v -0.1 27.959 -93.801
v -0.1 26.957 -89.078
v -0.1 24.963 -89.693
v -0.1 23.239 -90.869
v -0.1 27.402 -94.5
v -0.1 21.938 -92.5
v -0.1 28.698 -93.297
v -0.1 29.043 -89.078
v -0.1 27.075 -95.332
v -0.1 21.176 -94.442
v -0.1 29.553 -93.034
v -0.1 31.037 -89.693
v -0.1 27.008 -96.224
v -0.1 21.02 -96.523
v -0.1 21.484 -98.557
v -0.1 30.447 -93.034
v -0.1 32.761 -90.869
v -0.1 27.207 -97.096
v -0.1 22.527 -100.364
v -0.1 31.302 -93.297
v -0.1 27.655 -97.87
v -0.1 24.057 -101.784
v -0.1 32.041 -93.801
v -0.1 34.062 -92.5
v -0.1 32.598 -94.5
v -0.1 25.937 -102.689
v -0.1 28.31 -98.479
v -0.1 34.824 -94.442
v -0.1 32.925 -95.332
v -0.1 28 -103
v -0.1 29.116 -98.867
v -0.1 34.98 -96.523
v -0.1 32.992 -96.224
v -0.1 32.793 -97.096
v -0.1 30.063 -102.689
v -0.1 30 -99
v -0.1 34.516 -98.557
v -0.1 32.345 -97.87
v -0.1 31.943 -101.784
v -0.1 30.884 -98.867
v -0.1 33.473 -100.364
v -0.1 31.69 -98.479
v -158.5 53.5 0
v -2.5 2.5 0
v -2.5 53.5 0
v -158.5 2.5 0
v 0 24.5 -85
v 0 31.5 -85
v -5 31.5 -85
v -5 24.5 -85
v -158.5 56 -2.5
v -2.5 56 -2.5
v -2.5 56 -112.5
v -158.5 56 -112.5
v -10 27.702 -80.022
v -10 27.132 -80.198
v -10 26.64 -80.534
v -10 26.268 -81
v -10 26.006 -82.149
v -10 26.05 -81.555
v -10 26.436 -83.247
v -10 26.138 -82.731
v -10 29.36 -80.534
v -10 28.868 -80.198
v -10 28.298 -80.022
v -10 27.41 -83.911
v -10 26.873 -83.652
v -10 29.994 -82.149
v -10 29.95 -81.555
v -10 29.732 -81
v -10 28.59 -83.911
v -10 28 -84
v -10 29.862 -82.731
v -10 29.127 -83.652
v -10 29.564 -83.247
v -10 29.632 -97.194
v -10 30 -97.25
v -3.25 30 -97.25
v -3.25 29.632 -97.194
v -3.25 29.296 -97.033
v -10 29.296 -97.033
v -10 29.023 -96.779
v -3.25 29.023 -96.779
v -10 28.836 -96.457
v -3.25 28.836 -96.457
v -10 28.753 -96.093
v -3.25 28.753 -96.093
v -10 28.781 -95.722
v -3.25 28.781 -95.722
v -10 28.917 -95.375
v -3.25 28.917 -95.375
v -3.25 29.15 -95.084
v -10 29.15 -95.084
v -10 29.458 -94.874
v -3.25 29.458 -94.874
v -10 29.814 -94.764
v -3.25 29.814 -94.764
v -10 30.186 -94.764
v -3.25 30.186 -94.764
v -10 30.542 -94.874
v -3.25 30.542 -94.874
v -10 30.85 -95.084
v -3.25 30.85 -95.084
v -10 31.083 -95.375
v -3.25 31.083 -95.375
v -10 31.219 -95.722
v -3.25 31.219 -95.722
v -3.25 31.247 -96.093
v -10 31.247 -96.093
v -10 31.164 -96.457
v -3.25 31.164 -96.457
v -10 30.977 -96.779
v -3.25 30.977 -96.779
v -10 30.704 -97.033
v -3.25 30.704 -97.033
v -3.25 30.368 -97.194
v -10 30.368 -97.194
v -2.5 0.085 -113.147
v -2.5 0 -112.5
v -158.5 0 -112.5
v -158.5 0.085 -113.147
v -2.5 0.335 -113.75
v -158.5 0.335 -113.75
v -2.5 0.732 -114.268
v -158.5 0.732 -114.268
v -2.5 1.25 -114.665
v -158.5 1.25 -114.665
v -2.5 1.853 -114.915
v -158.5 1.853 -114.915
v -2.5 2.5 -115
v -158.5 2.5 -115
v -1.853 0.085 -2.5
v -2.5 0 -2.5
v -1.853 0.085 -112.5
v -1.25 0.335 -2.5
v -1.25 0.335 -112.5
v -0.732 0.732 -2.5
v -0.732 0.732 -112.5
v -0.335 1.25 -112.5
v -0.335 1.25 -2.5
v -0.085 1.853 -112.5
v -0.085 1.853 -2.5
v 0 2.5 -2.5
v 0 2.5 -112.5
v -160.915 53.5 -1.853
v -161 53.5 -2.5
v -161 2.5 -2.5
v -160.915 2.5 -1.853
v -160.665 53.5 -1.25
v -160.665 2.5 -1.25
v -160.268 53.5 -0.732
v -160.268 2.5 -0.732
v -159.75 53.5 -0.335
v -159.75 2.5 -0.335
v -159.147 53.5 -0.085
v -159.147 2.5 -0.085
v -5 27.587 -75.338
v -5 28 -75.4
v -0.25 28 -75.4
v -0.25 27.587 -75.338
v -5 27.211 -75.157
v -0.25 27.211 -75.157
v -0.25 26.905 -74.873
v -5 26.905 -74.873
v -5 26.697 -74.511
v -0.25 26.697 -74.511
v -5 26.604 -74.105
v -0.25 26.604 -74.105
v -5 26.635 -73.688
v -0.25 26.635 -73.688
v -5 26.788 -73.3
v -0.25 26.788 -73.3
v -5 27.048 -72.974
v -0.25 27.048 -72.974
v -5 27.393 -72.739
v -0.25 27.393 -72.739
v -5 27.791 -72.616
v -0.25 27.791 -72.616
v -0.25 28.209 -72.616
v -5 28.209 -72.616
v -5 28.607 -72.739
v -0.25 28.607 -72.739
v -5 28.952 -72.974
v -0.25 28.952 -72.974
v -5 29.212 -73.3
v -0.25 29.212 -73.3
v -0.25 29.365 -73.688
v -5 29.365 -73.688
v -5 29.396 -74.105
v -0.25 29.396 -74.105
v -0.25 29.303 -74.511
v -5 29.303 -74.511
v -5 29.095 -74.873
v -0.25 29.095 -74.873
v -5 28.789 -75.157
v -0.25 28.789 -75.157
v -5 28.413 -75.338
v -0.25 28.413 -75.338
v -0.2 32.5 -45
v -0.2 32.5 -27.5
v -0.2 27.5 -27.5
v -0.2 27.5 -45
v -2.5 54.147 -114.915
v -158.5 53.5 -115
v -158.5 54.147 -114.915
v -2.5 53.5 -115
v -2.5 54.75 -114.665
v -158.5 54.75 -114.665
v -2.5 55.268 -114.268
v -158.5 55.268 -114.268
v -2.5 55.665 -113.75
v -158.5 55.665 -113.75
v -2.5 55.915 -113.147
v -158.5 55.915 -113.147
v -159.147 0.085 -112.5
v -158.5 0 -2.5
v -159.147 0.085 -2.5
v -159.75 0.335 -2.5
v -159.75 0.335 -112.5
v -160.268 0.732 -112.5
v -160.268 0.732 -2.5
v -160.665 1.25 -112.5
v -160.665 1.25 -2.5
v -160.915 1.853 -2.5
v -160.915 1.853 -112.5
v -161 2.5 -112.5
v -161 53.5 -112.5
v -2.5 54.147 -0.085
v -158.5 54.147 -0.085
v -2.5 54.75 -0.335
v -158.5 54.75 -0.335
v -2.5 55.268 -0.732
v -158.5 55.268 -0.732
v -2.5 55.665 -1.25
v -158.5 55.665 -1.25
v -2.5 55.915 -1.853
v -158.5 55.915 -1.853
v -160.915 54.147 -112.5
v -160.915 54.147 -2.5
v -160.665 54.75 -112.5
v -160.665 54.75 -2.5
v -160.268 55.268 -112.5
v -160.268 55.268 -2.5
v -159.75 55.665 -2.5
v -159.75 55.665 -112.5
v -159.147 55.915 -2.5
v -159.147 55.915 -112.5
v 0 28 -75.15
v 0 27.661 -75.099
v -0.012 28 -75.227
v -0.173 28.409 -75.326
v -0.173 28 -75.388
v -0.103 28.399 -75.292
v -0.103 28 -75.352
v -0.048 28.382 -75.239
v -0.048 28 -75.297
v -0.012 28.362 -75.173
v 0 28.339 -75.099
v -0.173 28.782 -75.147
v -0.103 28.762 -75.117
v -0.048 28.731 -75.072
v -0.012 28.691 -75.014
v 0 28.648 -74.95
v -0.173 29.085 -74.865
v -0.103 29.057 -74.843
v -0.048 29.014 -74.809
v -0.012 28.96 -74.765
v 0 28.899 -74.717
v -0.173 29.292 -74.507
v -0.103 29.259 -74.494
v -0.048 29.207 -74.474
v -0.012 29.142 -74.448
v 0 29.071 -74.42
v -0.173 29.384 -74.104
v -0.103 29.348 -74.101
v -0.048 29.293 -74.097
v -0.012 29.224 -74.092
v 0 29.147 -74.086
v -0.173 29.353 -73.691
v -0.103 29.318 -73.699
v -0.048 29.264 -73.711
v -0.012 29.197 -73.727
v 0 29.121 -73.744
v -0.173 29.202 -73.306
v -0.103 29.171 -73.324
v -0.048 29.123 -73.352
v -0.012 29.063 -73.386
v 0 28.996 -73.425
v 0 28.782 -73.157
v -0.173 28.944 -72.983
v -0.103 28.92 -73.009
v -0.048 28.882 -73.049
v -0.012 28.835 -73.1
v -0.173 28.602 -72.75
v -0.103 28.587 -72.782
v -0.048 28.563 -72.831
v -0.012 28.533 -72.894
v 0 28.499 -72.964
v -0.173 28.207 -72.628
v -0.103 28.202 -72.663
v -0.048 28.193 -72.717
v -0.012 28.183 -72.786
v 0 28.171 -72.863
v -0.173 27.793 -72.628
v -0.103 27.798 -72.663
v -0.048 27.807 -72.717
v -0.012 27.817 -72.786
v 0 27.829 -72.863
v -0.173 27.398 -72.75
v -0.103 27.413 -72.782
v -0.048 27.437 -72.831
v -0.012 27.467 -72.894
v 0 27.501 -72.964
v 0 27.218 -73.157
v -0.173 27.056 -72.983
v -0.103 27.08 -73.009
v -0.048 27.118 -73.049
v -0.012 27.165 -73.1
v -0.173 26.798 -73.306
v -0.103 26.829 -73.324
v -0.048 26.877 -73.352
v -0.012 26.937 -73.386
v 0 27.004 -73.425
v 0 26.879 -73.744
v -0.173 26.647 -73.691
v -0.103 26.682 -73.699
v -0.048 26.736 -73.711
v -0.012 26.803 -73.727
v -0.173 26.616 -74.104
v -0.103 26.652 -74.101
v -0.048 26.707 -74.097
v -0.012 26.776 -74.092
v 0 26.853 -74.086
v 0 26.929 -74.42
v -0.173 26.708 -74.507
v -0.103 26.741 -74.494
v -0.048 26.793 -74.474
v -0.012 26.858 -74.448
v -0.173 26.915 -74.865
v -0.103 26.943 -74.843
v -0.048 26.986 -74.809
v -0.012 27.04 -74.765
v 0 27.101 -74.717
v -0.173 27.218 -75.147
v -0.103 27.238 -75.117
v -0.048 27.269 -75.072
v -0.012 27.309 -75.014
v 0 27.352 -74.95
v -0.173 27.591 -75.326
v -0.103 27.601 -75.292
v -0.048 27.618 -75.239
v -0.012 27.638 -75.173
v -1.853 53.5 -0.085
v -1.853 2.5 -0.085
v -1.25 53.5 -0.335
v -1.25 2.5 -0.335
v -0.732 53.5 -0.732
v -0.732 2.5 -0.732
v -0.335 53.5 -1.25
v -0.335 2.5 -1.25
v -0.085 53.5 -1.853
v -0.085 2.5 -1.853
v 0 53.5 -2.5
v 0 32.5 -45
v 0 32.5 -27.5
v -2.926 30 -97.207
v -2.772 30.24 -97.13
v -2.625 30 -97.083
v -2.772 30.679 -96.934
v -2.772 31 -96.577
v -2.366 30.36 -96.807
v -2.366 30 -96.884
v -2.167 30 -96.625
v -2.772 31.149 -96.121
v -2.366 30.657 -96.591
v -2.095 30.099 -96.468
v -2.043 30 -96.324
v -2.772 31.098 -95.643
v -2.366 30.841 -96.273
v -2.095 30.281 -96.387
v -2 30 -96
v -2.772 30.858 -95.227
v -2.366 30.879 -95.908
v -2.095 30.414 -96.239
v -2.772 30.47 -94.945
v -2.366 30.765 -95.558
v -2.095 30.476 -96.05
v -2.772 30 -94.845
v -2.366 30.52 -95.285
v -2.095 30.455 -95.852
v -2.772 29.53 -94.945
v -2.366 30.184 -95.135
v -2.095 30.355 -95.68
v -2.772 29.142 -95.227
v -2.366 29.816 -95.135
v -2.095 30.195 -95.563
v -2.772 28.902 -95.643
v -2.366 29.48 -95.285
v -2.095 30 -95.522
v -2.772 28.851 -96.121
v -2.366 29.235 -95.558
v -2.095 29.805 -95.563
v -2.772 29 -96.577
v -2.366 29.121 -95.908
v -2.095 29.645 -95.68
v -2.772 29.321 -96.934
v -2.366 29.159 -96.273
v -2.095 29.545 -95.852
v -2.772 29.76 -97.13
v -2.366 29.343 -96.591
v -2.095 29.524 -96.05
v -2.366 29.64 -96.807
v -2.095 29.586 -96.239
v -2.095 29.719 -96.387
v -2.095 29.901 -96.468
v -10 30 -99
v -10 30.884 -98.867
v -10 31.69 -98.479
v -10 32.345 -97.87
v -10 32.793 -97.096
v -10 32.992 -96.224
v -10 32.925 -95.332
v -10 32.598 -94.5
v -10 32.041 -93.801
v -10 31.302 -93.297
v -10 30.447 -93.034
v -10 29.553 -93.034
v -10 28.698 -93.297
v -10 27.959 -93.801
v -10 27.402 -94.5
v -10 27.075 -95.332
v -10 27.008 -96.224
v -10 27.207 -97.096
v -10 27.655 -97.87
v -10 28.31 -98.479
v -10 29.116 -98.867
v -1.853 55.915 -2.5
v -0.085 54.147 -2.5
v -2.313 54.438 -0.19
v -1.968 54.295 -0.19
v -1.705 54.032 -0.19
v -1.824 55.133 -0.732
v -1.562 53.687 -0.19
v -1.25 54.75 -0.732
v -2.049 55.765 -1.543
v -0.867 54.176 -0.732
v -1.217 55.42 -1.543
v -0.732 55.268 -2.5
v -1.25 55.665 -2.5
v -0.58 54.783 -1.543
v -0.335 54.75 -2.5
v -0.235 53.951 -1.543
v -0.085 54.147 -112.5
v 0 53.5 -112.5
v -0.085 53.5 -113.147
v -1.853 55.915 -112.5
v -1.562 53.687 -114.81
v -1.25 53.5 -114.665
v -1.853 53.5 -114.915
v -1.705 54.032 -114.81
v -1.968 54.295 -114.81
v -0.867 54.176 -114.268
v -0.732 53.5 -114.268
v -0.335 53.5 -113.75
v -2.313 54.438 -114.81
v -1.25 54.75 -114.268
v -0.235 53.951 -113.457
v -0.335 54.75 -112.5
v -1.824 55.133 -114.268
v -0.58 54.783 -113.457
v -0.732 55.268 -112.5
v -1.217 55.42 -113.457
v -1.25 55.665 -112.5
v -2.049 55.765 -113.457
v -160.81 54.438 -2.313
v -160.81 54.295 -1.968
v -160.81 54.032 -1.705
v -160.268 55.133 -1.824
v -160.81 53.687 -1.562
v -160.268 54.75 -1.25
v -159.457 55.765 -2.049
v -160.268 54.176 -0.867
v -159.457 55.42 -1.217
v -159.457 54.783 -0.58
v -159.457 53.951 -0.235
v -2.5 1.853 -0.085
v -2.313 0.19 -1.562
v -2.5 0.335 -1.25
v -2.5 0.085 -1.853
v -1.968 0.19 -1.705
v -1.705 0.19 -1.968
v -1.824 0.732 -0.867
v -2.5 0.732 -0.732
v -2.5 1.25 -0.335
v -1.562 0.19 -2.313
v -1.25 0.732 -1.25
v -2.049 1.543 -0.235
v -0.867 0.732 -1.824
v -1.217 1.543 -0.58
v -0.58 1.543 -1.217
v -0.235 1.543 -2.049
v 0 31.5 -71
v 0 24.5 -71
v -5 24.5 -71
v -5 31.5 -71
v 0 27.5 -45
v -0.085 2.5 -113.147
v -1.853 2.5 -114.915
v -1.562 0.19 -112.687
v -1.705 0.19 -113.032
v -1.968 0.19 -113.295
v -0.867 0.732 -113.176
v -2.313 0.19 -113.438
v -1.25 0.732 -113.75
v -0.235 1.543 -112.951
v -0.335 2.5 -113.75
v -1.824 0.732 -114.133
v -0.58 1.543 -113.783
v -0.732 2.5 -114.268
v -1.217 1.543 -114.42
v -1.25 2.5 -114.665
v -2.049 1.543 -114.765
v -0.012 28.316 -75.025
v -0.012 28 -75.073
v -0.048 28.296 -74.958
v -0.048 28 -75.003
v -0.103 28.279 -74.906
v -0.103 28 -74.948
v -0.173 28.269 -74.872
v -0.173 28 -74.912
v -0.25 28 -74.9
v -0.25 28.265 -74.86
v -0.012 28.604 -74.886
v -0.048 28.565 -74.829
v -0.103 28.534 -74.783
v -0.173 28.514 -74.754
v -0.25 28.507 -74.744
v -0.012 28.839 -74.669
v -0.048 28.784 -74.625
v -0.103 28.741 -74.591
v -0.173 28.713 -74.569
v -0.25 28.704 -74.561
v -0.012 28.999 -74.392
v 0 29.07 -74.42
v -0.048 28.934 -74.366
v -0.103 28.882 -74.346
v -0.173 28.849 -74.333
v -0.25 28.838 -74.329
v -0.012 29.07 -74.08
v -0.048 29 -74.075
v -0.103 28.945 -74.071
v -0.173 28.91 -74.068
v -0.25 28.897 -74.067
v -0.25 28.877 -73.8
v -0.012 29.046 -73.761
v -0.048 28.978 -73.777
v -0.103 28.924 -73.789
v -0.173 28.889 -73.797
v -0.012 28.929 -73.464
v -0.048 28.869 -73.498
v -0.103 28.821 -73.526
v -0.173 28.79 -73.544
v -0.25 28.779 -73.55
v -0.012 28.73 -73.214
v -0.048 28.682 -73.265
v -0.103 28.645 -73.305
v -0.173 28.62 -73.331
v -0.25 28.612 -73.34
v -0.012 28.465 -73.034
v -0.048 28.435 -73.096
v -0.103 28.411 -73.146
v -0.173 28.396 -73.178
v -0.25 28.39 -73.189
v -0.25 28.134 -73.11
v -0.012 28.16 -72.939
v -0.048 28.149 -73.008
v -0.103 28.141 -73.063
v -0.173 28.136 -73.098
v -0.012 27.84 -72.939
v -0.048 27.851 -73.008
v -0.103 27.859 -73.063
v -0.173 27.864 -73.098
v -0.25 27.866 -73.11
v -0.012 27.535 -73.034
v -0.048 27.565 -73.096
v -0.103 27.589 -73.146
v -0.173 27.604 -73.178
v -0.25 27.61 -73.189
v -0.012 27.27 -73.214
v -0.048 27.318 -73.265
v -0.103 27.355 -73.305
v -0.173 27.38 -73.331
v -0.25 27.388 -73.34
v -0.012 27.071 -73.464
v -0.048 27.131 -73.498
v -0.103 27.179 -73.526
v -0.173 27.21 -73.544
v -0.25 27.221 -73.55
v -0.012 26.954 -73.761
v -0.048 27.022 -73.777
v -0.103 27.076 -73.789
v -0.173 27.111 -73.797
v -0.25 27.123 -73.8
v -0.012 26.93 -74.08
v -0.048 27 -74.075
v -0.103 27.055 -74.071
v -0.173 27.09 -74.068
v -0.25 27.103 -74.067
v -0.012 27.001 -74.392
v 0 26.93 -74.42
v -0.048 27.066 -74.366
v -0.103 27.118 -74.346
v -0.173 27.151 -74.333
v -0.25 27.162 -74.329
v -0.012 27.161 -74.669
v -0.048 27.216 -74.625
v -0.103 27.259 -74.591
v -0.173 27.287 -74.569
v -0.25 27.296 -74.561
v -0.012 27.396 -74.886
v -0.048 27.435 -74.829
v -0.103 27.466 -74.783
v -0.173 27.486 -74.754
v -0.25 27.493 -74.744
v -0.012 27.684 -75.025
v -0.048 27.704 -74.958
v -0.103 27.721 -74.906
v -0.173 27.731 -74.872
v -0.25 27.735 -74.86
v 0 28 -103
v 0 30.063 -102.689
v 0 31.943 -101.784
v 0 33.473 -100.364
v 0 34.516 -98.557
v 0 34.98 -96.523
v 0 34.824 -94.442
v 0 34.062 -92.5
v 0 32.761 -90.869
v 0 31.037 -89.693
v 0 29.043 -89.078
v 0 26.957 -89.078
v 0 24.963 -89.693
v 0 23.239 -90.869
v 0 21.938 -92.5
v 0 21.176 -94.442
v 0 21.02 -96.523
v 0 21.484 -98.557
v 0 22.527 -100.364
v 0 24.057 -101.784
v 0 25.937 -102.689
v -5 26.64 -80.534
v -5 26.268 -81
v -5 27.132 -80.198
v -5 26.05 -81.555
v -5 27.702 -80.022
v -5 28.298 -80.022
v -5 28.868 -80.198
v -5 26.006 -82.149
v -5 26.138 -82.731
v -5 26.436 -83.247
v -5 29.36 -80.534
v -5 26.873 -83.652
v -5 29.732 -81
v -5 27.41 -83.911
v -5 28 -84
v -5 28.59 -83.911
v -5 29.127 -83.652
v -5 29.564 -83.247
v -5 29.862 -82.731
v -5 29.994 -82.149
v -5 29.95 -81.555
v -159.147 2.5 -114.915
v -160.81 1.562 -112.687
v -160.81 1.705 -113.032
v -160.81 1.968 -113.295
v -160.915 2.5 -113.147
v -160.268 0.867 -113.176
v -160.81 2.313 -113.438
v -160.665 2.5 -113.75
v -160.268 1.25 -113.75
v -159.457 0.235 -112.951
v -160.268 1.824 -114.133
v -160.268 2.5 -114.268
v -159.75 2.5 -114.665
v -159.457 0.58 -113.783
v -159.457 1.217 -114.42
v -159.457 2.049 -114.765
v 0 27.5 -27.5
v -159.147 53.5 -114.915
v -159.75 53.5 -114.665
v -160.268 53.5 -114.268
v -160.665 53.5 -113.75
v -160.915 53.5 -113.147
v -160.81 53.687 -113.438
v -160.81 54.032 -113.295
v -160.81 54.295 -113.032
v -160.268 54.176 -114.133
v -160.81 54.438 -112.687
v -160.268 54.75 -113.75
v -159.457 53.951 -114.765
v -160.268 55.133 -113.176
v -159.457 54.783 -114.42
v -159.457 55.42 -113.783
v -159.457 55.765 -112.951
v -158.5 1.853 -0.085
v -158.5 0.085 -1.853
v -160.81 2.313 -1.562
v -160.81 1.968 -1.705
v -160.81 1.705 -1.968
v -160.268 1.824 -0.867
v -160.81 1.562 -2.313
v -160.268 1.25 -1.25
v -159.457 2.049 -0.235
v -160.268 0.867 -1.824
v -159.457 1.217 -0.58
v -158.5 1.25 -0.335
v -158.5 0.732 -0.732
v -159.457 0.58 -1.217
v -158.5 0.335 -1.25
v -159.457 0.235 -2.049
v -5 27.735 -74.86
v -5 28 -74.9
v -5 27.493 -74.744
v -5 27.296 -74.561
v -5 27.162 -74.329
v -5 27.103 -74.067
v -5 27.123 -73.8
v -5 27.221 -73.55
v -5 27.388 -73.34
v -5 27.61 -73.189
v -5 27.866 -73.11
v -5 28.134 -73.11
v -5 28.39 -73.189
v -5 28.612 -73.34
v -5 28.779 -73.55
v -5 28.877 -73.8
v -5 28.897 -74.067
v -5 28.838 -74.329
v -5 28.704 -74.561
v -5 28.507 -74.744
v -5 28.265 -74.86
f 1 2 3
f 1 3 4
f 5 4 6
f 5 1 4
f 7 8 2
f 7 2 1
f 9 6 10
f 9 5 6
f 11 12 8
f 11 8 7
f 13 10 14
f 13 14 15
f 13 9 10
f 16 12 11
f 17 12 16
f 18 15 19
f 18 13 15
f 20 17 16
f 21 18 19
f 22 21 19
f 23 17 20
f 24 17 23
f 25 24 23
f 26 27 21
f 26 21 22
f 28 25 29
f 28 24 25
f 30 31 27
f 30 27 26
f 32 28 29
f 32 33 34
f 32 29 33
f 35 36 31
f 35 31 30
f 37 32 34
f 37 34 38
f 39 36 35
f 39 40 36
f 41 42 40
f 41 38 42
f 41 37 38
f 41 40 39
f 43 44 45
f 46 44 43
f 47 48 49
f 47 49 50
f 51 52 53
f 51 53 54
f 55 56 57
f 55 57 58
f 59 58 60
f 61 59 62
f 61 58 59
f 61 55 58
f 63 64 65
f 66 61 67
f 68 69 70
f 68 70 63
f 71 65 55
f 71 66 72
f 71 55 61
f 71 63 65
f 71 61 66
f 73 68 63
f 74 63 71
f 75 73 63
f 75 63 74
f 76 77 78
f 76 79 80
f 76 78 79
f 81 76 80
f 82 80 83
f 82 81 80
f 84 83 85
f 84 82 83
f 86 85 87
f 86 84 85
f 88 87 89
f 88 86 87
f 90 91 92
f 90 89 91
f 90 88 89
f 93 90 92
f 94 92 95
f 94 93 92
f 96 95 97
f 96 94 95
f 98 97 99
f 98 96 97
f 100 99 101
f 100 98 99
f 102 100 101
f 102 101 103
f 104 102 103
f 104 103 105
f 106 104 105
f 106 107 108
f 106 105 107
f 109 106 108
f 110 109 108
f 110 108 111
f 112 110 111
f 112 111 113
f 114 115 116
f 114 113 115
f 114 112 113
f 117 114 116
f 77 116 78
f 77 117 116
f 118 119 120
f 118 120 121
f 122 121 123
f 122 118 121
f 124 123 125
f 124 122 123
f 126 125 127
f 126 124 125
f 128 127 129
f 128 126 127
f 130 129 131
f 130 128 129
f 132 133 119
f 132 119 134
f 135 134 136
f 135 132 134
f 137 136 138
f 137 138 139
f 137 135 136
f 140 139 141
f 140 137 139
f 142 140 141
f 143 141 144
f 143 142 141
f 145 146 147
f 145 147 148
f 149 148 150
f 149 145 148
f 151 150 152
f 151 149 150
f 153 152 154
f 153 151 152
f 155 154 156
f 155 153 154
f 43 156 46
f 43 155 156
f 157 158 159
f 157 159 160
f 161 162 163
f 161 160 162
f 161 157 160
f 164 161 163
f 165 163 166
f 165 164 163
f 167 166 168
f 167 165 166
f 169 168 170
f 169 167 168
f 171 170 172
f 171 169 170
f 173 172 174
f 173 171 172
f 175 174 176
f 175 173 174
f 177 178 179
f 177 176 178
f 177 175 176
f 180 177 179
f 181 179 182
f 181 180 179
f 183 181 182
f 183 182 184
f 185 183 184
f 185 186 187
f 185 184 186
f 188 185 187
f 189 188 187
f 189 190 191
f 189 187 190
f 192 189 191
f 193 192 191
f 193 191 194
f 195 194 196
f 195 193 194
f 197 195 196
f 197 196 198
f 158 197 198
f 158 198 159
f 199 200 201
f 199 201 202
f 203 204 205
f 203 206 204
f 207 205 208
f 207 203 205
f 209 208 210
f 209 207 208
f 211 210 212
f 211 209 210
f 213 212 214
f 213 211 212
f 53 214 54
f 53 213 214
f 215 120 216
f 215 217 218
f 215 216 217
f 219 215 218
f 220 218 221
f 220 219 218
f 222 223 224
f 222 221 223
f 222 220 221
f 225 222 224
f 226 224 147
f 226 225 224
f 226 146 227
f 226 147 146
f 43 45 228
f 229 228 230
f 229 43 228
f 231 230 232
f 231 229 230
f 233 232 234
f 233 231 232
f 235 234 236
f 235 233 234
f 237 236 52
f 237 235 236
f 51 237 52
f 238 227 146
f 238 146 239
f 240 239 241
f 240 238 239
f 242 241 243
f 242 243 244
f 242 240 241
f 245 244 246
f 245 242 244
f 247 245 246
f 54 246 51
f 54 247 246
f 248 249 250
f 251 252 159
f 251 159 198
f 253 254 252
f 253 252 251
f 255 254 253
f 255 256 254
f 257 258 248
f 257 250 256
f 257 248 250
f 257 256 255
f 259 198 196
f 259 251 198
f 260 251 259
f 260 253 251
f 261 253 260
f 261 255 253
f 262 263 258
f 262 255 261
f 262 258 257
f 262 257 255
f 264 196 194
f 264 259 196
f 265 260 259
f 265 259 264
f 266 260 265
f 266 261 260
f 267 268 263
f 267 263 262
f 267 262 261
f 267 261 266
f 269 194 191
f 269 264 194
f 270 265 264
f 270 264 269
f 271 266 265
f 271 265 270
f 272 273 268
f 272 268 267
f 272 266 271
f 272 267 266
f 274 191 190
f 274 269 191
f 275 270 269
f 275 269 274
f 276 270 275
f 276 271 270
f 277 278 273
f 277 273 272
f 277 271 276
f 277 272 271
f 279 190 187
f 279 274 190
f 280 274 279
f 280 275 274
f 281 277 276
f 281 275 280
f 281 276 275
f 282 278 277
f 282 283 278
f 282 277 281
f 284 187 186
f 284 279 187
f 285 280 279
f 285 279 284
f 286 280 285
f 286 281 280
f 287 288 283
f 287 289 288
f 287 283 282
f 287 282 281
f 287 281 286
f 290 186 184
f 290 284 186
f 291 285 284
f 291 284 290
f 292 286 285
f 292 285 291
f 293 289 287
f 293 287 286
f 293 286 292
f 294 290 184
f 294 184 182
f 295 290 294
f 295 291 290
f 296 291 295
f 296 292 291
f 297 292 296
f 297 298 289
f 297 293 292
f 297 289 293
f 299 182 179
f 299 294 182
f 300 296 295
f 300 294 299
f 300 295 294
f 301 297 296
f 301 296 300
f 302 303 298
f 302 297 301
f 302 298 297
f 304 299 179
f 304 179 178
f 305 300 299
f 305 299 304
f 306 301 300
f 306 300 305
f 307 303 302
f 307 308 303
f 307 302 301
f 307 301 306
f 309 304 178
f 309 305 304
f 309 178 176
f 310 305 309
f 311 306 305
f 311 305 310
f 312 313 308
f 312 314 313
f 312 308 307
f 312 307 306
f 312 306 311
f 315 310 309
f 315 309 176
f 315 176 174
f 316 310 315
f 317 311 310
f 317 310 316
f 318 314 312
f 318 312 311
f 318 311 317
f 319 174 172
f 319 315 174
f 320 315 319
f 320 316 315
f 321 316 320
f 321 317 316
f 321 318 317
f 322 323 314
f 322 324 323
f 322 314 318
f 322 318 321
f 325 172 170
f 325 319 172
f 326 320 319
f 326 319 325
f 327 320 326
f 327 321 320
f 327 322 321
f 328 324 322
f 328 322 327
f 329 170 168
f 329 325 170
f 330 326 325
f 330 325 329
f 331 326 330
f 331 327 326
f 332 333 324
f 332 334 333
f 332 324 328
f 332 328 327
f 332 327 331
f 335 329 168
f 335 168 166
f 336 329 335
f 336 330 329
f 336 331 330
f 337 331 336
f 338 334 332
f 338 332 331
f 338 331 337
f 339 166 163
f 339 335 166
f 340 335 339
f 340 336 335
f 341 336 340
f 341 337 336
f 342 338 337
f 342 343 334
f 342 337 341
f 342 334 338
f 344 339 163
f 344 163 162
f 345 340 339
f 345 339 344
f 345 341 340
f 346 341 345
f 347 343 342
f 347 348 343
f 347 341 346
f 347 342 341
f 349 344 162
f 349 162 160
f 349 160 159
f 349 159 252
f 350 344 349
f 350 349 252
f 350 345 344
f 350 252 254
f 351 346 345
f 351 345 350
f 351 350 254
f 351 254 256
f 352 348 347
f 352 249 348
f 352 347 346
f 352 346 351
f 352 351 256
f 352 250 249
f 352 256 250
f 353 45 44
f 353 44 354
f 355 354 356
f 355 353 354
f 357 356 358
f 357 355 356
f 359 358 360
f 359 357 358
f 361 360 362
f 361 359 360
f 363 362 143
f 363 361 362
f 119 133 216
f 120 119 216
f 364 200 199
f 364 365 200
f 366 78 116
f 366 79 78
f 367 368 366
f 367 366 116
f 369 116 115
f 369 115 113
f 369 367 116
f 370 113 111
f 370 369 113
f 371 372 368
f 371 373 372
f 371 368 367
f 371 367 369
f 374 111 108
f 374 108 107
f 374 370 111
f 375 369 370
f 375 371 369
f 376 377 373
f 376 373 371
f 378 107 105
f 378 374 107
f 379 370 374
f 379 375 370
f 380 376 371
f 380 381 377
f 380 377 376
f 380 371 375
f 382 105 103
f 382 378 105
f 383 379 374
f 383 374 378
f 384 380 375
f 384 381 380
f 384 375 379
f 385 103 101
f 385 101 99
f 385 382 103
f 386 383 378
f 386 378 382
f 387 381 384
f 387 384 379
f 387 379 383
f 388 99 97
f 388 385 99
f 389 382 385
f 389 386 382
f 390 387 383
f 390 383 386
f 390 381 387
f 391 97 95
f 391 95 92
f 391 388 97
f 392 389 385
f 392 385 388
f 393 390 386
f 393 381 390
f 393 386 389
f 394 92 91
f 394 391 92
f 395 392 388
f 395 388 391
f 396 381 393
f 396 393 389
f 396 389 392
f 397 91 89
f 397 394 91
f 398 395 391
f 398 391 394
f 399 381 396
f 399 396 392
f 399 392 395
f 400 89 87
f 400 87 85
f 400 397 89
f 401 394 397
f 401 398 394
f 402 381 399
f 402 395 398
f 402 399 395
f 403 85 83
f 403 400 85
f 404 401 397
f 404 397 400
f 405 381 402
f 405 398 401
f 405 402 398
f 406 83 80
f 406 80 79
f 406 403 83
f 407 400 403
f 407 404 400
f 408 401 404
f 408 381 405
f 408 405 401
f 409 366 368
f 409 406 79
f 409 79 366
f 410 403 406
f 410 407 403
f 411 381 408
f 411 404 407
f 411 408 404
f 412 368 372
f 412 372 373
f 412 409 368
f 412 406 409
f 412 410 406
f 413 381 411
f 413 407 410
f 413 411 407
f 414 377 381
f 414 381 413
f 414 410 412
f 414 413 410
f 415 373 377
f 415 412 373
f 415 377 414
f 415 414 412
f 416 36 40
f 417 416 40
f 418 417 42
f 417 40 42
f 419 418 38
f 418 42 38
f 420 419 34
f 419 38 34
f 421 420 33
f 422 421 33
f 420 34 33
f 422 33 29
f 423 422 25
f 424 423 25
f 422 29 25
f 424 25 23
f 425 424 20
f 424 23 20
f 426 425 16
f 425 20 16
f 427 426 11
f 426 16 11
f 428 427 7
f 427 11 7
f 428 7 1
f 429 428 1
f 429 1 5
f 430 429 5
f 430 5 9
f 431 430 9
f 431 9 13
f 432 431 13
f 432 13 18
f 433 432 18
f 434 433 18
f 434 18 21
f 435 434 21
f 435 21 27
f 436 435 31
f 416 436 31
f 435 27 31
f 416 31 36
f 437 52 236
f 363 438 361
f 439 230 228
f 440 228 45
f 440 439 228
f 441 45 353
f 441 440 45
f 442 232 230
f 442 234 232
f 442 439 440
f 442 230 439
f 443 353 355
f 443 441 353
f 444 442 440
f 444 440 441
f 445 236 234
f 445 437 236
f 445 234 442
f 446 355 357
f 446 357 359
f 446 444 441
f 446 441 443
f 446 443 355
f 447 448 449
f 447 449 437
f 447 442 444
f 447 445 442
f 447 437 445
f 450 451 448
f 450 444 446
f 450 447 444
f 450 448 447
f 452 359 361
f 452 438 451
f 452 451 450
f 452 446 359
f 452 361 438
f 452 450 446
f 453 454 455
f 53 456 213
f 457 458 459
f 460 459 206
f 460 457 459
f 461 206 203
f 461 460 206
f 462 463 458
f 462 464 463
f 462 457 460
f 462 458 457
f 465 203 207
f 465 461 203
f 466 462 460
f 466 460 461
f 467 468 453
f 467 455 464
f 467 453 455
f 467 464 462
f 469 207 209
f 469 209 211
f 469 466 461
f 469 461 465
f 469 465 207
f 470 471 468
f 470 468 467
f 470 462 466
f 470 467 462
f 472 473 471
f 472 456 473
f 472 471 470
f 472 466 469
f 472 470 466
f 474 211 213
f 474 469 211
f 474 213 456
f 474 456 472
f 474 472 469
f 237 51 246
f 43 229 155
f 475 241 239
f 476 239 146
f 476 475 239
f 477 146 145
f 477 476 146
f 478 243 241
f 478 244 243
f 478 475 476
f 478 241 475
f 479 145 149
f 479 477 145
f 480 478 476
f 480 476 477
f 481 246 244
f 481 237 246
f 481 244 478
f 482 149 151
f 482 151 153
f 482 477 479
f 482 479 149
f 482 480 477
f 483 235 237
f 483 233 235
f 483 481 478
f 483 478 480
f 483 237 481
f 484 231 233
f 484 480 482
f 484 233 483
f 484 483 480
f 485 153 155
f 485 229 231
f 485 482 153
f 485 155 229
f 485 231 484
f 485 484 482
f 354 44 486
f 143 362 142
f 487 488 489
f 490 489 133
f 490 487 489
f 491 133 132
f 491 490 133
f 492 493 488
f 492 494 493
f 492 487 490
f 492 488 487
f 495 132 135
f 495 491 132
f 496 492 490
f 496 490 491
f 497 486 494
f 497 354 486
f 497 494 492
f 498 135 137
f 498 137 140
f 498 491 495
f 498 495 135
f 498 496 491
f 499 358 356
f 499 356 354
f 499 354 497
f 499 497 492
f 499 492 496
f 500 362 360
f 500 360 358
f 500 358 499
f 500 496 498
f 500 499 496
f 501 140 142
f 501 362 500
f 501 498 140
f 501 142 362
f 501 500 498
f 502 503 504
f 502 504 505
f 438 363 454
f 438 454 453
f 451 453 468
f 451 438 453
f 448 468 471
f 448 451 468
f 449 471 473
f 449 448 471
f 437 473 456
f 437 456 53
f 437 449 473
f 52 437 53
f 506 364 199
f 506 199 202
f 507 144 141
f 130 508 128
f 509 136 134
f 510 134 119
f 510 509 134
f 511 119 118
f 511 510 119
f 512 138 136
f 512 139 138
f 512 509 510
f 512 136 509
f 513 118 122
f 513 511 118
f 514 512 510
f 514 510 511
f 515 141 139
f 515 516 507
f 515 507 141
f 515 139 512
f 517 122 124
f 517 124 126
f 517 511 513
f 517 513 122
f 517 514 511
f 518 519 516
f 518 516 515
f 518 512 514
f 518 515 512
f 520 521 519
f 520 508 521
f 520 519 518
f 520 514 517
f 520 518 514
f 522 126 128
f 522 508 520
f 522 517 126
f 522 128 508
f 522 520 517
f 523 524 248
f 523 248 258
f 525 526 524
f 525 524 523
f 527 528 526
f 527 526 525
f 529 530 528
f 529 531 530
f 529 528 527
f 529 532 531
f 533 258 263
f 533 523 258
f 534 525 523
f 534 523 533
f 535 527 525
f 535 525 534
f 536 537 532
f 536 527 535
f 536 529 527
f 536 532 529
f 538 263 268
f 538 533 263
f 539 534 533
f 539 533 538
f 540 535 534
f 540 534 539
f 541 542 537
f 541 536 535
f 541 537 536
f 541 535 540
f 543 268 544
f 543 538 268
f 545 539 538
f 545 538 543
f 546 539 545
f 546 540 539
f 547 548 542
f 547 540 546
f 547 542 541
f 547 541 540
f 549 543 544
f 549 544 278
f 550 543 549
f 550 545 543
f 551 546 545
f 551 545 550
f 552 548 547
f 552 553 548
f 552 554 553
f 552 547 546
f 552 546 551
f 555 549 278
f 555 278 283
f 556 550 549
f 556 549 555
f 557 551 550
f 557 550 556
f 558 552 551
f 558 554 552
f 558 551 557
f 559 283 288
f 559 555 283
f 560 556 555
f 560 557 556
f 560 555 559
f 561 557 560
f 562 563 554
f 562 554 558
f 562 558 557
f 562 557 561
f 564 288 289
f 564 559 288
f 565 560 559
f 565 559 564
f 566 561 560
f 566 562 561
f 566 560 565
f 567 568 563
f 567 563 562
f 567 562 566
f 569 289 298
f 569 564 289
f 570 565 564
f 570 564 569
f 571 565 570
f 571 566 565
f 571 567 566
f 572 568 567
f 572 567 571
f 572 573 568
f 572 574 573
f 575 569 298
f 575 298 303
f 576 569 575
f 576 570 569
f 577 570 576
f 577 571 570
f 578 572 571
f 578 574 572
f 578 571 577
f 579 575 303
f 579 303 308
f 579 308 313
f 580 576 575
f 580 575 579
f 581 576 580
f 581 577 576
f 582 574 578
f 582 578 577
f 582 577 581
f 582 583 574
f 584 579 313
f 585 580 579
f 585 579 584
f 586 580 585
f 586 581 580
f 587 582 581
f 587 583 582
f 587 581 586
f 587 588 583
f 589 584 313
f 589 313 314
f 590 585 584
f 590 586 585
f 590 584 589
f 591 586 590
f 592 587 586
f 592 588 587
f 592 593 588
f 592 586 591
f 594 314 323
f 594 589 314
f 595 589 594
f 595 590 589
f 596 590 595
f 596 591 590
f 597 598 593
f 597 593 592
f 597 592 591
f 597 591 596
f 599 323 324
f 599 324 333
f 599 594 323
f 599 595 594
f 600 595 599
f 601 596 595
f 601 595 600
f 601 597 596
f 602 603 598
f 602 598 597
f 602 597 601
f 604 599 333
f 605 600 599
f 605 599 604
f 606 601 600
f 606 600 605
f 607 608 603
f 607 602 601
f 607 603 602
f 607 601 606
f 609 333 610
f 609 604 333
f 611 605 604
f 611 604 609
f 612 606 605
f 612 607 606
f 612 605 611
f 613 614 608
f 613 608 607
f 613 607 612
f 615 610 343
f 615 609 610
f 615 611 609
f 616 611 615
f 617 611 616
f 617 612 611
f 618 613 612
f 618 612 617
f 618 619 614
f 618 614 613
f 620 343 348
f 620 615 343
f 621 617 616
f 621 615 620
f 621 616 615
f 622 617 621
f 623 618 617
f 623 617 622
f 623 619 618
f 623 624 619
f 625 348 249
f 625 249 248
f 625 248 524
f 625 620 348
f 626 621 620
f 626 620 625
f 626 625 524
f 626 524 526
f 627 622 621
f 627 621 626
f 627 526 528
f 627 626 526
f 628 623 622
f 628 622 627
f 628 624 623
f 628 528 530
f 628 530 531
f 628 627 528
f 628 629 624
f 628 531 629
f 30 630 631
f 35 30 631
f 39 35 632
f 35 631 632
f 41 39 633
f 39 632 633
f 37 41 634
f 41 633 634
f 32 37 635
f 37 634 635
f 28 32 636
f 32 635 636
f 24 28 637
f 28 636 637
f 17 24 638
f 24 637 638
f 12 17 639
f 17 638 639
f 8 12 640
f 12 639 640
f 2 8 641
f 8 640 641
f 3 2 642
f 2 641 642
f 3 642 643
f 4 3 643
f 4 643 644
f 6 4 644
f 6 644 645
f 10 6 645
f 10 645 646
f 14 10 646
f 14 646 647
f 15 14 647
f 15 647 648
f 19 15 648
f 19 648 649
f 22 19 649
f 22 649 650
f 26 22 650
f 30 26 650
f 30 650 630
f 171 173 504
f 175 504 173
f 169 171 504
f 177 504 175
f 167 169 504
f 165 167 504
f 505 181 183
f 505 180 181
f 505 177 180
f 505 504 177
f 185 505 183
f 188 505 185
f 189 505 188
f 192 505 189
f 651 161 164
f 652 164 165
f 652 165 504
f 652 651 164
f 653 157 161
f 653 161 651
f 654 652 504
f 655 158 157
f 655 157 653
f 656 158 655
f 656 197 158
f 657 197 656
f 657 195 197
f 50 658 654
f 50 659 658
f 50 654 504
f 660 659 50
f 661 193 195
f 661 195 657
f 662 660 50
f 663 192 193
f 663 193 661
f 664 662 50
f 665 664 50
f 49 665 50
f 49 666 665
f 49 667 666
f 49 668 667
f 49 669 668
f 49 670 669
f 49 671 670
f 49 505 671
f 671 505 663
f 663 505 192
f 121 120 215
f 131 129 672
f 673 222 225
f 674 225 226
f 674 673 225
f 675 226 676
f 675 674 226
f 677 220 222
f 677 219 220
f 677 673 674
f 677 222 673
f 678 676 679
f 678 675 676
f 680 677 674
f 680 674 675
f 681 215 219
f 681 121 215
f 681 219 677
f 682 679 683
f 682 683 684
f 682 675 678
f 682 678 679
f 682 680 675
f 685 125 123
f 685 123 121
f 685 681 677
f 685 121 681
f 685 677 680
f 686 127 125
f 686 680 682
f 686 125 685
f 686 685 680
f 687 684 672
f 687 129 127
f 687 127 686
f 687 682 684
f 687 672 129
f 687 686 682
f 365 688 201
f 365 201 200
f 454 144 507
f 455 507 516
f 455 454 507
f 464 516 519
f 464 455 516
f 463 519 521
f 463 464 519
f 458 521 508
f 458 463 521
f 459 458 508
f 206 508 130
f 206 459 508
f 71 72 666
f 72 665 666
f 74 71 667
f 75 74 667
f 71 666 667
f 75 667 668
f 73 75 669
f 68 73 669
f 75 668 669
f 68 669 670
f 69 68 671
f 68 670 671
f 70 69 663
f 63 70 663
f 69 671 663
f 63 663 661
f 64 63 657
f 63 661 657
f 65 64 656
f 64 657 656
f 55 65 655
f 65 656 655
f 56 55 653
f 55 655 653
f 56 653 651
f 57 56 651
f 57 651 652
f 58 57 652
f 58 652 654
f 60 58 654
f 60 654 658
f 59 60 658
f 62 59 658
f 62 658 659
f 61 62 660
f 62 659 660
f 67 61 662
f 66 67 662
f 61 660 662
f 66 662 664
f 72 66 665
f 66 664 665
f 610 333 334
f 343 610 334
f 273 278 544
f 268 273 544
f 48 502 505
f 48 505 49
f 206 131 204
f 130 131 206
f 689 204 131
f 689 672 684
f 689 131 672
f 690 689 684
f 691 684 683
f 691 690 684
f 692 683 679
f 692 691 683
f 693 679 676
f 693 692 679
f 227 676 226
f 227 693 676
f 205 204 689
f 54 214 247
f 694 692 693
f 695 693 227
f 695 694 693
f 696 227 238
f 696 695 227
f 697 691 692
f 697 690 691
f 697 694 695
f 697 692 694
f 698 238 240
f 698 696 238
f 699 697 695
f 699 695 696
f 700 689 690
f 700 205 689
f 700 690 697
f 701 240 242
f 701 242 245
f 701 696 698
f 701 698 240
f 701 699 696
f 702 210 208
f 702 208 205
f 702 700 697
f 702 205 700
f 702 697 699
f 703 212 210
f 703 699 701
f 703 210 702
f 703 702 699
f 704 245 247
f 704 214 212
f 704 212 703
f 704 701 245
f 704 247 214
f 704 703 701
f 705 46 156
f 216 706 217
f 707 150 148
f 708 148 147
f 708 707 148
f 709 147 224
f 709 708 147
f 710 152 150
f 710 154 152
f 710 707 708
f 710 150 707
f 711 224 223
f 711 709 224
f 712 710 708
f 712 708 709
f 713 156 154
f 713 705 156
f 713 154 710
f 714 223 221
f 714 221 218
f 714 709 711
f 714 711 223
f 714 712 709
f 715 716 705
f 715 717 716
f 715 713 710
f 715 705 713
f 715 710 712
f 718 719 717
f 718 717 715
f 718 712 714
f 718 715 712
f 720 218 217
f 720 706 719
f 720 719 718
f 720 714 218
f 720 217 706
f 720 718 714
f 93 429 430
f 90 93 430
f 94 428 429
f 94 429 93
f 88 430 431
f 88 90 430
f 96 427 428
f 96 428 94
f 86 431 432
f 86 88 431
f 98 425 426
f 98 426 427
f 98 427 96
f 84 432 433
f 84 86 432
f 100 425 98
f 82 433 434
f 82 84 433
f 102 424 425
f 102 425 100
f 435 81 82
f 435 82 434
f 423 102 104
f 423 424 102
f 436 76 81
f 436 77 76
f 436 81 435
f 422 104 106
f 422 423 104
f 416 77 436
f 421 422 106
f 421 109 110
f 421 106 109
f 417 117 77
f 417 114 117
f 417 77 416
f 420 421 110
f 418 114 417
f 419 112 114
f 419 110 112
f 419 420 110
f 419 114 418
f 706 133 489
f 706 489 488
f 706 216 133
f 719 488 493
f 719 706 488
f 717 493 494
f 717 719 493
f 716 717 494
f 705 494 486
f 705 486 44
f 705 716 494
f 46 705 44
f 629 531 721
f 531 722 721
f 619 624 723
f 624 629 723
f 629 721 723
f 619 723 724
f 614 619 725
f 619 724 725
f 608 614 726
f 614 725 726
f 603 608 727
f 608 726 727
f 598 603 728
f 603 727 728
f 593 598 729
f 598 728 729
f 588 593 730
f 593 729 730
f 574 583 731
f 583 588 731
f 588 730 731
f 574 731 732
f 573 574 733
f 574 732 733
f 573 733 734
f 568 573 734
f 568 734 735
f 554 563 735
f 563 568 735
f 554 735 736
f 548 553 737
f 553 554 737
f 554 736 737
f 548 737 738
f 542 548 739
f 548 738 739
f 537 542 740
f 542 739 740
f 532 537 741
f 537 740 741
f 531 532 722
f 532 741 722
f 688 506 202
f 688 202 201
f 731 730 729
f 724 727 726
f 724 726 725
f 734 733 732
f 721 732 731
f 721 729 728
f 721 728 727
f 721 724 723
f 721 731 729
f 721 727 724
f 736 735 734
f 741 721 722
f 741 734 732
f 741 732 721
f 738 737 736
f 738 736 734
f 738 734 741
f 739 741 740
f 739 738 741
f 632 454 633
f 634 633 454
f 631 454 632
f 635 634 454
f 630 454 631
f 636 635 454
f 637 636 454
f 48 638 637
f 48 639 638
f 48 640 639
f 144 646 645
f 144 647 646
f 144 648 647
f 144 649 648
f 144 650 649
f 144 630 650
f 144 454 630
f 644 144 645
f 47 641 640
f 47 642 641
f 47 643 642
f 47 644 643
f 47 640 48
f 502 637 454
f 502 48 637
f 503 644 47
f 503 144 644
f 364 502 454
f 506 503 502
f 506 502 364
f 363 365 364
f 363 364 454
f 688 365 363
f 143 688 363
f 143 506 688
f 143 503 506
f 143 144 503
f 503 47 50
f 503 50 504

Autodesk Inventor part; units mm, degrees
ref_plane "YZ Plane" through (0, 0, 0) normal (1, 0, 0) x (0, 1, 0)
ref_plane "XZ Plane" through (0, 0, 0) normal (0, 1, 0) x (-1, 0, 0)
ref_plane "XY Plane" through (0, 0, 0) normal (0, 0, 1) x (1, 0, 0)
sketch "Sketch1" plane through (0, 0, 0) normal (0, 1, 0) x (-1, 0, 0)
  line L0 (0, 0) -> (161, 0)
  line L1 (161, 0) -> (161, -115)
  line L2 (161, -115) -> (0, -115)
  line L3 (0, -115) -> (0, 0)
  dimension "d0" = 161
  dimension "d1" = 115
extrude "Extrusion1" add sketch "Sketch1" along normal blind 56
fillet "Fillet1" radius 2.5 12 edges at (0, 56, -57.5) (0, 28, -115) (0, 28, 0) (0, 0, -57.5) (-80.5, 0, 0) (-80.5, 0, -115) (-80.5, 56, -115) (-80.5, 56, 0) (-161, 56, -57.5) (-161, 28, 0) (-161, 28, -115) (-161, 0, -57.5)
sketch "Sketch2" plane through (0, 2.5, -112.5) normal (1, 0, 0) x (0, 0, -1)
  line L0 (2.5, 0) -> (2.5, 51) projected
  line L1 (0, 0) -> (-110, 0) projected
  line L2 (0, 51) -> (0, 0) projected
  line L3 (-110, 51) -> (0, 51) projected
  line L4 (-110, 0) -> (-110, 51) projected
  line L5 (0, 53.5) -> (-110, 53.5) projected
  line L6 (-41.5, 29) -> (-27.5, 29)
  line L7 (-27.5, 29) -> (-27.5, 22)
  line L8 (-27.5, 22) -> (-41.5, 22)
  line L9 (-41.5, 22) -> (-41.5, 29)
  line L10 (-85, 30) -> (-67.5, 30)
  line L11 (-67.5, 30) -> (-67.5, 25)
  line L12 (-67.5, 25) -> (-85, 25)
  line L13 (-85, 25) -> (-85, 30)
  circle A0 centre (-30.5, 25.5) radius 2
  line L14 (-41.5, 22.5) -> (-35.5, 22.5)
  line L15 (-35.5, 22.5) -> (-35.5, 28.5)
  line L16 (-35.5, 28.5) -> (-41.5, 28.5)
  line L17 (-41.5, 28.5) -> (-41.5, 22.5)
  line L18 (-41.5, 22.5) -> (-35.5, 28.5) construction
  line L19 (-35.5, 22.5) -> (-41.5, 28.5) construction
  circle A1 centre (-16.5, 25.5) radius 7
  circle A2 centre (-16.5, 27.5) radius 3
  point P0 (-112.5, -2.5)
  point P1 (-38.5, 25.5)
  point P2 (-41.5, 22.5)
  dimension "d5" = 26
  dimension "d6" = 19
  dimension "d7" = 14
  dimension "d8" = 7
  dimension "d9" = 30
  dimension "d10" = 17.5
  dimension "d11" = 5
  dimension "d12" = 70
  dimension "d13" = 23.5
  dimension "d14" = 24.5
  dimension "d15" = 4
  dimension "d16" = 33
  dimension "d17" = 41
  dimension "d18" = 6
  dimension "d19" = 6
  dimension "d20" = 14
  dimension "d21" = 19
  dimension "d22" = 6
  dimension "d44" = 28
  dimension "d45" = 28
  dimension "d46" = 28
extrude "Extrusion2" cut sketch "Sketch2" against normal blind 10 contours A2
extrude "Extrusion3" cut sketch "Sketch2" against normal blind 0.1 contours A1
extrude "Extrusion4" cut sketch "Sketch2" against normal blind 10 contours A0
extrude "Extrusion5" cut sketch "Sketch2" against normal blind 5 contours L6 L7 L8 L9 L14 L15 L16 | L16 L15 L14 L9 | A0
extrude "Extrusion7" cut sketch "Sketch2" against normal blind 0.2 contours L10 L11 L12 L13
sketch "Sketch3" plane through (-10, 30, -96) normal (1, 0, 0) x (0, 0, -1)
  circle A0 centre (0, 0) radius 1.25
  point P0 (-96, -30)
  dimension "d35" = 2.5
extrude "Extrusion8" add sketch "Sketch3" along normal blind 8
fillet "Fillet2" radius 1.25 1 edges at (-2, 30, -94.75)
sketch "Sketch4" plane through (-5, 2.5, -112.5) normal (1, 0, 0) x (0, 0, -1)
  circle A0 centre (-38.5, 25.5) radius 1.4
  circle A1 centre (-38.5, 25.5) radius 0.9
  point P0 (-112.5, -2.5)
  dimension "d39" = 2.8
  dimension "d40" = 1.8
extrude "Extrusion9" add sketch "Sketch4" along normal blind 5
fillet "Fillet3" radius 0.25 2 edges at (0, 28, -73.1) (0, 28, -72.6)
properties part number "22Ah BatteryPack"
